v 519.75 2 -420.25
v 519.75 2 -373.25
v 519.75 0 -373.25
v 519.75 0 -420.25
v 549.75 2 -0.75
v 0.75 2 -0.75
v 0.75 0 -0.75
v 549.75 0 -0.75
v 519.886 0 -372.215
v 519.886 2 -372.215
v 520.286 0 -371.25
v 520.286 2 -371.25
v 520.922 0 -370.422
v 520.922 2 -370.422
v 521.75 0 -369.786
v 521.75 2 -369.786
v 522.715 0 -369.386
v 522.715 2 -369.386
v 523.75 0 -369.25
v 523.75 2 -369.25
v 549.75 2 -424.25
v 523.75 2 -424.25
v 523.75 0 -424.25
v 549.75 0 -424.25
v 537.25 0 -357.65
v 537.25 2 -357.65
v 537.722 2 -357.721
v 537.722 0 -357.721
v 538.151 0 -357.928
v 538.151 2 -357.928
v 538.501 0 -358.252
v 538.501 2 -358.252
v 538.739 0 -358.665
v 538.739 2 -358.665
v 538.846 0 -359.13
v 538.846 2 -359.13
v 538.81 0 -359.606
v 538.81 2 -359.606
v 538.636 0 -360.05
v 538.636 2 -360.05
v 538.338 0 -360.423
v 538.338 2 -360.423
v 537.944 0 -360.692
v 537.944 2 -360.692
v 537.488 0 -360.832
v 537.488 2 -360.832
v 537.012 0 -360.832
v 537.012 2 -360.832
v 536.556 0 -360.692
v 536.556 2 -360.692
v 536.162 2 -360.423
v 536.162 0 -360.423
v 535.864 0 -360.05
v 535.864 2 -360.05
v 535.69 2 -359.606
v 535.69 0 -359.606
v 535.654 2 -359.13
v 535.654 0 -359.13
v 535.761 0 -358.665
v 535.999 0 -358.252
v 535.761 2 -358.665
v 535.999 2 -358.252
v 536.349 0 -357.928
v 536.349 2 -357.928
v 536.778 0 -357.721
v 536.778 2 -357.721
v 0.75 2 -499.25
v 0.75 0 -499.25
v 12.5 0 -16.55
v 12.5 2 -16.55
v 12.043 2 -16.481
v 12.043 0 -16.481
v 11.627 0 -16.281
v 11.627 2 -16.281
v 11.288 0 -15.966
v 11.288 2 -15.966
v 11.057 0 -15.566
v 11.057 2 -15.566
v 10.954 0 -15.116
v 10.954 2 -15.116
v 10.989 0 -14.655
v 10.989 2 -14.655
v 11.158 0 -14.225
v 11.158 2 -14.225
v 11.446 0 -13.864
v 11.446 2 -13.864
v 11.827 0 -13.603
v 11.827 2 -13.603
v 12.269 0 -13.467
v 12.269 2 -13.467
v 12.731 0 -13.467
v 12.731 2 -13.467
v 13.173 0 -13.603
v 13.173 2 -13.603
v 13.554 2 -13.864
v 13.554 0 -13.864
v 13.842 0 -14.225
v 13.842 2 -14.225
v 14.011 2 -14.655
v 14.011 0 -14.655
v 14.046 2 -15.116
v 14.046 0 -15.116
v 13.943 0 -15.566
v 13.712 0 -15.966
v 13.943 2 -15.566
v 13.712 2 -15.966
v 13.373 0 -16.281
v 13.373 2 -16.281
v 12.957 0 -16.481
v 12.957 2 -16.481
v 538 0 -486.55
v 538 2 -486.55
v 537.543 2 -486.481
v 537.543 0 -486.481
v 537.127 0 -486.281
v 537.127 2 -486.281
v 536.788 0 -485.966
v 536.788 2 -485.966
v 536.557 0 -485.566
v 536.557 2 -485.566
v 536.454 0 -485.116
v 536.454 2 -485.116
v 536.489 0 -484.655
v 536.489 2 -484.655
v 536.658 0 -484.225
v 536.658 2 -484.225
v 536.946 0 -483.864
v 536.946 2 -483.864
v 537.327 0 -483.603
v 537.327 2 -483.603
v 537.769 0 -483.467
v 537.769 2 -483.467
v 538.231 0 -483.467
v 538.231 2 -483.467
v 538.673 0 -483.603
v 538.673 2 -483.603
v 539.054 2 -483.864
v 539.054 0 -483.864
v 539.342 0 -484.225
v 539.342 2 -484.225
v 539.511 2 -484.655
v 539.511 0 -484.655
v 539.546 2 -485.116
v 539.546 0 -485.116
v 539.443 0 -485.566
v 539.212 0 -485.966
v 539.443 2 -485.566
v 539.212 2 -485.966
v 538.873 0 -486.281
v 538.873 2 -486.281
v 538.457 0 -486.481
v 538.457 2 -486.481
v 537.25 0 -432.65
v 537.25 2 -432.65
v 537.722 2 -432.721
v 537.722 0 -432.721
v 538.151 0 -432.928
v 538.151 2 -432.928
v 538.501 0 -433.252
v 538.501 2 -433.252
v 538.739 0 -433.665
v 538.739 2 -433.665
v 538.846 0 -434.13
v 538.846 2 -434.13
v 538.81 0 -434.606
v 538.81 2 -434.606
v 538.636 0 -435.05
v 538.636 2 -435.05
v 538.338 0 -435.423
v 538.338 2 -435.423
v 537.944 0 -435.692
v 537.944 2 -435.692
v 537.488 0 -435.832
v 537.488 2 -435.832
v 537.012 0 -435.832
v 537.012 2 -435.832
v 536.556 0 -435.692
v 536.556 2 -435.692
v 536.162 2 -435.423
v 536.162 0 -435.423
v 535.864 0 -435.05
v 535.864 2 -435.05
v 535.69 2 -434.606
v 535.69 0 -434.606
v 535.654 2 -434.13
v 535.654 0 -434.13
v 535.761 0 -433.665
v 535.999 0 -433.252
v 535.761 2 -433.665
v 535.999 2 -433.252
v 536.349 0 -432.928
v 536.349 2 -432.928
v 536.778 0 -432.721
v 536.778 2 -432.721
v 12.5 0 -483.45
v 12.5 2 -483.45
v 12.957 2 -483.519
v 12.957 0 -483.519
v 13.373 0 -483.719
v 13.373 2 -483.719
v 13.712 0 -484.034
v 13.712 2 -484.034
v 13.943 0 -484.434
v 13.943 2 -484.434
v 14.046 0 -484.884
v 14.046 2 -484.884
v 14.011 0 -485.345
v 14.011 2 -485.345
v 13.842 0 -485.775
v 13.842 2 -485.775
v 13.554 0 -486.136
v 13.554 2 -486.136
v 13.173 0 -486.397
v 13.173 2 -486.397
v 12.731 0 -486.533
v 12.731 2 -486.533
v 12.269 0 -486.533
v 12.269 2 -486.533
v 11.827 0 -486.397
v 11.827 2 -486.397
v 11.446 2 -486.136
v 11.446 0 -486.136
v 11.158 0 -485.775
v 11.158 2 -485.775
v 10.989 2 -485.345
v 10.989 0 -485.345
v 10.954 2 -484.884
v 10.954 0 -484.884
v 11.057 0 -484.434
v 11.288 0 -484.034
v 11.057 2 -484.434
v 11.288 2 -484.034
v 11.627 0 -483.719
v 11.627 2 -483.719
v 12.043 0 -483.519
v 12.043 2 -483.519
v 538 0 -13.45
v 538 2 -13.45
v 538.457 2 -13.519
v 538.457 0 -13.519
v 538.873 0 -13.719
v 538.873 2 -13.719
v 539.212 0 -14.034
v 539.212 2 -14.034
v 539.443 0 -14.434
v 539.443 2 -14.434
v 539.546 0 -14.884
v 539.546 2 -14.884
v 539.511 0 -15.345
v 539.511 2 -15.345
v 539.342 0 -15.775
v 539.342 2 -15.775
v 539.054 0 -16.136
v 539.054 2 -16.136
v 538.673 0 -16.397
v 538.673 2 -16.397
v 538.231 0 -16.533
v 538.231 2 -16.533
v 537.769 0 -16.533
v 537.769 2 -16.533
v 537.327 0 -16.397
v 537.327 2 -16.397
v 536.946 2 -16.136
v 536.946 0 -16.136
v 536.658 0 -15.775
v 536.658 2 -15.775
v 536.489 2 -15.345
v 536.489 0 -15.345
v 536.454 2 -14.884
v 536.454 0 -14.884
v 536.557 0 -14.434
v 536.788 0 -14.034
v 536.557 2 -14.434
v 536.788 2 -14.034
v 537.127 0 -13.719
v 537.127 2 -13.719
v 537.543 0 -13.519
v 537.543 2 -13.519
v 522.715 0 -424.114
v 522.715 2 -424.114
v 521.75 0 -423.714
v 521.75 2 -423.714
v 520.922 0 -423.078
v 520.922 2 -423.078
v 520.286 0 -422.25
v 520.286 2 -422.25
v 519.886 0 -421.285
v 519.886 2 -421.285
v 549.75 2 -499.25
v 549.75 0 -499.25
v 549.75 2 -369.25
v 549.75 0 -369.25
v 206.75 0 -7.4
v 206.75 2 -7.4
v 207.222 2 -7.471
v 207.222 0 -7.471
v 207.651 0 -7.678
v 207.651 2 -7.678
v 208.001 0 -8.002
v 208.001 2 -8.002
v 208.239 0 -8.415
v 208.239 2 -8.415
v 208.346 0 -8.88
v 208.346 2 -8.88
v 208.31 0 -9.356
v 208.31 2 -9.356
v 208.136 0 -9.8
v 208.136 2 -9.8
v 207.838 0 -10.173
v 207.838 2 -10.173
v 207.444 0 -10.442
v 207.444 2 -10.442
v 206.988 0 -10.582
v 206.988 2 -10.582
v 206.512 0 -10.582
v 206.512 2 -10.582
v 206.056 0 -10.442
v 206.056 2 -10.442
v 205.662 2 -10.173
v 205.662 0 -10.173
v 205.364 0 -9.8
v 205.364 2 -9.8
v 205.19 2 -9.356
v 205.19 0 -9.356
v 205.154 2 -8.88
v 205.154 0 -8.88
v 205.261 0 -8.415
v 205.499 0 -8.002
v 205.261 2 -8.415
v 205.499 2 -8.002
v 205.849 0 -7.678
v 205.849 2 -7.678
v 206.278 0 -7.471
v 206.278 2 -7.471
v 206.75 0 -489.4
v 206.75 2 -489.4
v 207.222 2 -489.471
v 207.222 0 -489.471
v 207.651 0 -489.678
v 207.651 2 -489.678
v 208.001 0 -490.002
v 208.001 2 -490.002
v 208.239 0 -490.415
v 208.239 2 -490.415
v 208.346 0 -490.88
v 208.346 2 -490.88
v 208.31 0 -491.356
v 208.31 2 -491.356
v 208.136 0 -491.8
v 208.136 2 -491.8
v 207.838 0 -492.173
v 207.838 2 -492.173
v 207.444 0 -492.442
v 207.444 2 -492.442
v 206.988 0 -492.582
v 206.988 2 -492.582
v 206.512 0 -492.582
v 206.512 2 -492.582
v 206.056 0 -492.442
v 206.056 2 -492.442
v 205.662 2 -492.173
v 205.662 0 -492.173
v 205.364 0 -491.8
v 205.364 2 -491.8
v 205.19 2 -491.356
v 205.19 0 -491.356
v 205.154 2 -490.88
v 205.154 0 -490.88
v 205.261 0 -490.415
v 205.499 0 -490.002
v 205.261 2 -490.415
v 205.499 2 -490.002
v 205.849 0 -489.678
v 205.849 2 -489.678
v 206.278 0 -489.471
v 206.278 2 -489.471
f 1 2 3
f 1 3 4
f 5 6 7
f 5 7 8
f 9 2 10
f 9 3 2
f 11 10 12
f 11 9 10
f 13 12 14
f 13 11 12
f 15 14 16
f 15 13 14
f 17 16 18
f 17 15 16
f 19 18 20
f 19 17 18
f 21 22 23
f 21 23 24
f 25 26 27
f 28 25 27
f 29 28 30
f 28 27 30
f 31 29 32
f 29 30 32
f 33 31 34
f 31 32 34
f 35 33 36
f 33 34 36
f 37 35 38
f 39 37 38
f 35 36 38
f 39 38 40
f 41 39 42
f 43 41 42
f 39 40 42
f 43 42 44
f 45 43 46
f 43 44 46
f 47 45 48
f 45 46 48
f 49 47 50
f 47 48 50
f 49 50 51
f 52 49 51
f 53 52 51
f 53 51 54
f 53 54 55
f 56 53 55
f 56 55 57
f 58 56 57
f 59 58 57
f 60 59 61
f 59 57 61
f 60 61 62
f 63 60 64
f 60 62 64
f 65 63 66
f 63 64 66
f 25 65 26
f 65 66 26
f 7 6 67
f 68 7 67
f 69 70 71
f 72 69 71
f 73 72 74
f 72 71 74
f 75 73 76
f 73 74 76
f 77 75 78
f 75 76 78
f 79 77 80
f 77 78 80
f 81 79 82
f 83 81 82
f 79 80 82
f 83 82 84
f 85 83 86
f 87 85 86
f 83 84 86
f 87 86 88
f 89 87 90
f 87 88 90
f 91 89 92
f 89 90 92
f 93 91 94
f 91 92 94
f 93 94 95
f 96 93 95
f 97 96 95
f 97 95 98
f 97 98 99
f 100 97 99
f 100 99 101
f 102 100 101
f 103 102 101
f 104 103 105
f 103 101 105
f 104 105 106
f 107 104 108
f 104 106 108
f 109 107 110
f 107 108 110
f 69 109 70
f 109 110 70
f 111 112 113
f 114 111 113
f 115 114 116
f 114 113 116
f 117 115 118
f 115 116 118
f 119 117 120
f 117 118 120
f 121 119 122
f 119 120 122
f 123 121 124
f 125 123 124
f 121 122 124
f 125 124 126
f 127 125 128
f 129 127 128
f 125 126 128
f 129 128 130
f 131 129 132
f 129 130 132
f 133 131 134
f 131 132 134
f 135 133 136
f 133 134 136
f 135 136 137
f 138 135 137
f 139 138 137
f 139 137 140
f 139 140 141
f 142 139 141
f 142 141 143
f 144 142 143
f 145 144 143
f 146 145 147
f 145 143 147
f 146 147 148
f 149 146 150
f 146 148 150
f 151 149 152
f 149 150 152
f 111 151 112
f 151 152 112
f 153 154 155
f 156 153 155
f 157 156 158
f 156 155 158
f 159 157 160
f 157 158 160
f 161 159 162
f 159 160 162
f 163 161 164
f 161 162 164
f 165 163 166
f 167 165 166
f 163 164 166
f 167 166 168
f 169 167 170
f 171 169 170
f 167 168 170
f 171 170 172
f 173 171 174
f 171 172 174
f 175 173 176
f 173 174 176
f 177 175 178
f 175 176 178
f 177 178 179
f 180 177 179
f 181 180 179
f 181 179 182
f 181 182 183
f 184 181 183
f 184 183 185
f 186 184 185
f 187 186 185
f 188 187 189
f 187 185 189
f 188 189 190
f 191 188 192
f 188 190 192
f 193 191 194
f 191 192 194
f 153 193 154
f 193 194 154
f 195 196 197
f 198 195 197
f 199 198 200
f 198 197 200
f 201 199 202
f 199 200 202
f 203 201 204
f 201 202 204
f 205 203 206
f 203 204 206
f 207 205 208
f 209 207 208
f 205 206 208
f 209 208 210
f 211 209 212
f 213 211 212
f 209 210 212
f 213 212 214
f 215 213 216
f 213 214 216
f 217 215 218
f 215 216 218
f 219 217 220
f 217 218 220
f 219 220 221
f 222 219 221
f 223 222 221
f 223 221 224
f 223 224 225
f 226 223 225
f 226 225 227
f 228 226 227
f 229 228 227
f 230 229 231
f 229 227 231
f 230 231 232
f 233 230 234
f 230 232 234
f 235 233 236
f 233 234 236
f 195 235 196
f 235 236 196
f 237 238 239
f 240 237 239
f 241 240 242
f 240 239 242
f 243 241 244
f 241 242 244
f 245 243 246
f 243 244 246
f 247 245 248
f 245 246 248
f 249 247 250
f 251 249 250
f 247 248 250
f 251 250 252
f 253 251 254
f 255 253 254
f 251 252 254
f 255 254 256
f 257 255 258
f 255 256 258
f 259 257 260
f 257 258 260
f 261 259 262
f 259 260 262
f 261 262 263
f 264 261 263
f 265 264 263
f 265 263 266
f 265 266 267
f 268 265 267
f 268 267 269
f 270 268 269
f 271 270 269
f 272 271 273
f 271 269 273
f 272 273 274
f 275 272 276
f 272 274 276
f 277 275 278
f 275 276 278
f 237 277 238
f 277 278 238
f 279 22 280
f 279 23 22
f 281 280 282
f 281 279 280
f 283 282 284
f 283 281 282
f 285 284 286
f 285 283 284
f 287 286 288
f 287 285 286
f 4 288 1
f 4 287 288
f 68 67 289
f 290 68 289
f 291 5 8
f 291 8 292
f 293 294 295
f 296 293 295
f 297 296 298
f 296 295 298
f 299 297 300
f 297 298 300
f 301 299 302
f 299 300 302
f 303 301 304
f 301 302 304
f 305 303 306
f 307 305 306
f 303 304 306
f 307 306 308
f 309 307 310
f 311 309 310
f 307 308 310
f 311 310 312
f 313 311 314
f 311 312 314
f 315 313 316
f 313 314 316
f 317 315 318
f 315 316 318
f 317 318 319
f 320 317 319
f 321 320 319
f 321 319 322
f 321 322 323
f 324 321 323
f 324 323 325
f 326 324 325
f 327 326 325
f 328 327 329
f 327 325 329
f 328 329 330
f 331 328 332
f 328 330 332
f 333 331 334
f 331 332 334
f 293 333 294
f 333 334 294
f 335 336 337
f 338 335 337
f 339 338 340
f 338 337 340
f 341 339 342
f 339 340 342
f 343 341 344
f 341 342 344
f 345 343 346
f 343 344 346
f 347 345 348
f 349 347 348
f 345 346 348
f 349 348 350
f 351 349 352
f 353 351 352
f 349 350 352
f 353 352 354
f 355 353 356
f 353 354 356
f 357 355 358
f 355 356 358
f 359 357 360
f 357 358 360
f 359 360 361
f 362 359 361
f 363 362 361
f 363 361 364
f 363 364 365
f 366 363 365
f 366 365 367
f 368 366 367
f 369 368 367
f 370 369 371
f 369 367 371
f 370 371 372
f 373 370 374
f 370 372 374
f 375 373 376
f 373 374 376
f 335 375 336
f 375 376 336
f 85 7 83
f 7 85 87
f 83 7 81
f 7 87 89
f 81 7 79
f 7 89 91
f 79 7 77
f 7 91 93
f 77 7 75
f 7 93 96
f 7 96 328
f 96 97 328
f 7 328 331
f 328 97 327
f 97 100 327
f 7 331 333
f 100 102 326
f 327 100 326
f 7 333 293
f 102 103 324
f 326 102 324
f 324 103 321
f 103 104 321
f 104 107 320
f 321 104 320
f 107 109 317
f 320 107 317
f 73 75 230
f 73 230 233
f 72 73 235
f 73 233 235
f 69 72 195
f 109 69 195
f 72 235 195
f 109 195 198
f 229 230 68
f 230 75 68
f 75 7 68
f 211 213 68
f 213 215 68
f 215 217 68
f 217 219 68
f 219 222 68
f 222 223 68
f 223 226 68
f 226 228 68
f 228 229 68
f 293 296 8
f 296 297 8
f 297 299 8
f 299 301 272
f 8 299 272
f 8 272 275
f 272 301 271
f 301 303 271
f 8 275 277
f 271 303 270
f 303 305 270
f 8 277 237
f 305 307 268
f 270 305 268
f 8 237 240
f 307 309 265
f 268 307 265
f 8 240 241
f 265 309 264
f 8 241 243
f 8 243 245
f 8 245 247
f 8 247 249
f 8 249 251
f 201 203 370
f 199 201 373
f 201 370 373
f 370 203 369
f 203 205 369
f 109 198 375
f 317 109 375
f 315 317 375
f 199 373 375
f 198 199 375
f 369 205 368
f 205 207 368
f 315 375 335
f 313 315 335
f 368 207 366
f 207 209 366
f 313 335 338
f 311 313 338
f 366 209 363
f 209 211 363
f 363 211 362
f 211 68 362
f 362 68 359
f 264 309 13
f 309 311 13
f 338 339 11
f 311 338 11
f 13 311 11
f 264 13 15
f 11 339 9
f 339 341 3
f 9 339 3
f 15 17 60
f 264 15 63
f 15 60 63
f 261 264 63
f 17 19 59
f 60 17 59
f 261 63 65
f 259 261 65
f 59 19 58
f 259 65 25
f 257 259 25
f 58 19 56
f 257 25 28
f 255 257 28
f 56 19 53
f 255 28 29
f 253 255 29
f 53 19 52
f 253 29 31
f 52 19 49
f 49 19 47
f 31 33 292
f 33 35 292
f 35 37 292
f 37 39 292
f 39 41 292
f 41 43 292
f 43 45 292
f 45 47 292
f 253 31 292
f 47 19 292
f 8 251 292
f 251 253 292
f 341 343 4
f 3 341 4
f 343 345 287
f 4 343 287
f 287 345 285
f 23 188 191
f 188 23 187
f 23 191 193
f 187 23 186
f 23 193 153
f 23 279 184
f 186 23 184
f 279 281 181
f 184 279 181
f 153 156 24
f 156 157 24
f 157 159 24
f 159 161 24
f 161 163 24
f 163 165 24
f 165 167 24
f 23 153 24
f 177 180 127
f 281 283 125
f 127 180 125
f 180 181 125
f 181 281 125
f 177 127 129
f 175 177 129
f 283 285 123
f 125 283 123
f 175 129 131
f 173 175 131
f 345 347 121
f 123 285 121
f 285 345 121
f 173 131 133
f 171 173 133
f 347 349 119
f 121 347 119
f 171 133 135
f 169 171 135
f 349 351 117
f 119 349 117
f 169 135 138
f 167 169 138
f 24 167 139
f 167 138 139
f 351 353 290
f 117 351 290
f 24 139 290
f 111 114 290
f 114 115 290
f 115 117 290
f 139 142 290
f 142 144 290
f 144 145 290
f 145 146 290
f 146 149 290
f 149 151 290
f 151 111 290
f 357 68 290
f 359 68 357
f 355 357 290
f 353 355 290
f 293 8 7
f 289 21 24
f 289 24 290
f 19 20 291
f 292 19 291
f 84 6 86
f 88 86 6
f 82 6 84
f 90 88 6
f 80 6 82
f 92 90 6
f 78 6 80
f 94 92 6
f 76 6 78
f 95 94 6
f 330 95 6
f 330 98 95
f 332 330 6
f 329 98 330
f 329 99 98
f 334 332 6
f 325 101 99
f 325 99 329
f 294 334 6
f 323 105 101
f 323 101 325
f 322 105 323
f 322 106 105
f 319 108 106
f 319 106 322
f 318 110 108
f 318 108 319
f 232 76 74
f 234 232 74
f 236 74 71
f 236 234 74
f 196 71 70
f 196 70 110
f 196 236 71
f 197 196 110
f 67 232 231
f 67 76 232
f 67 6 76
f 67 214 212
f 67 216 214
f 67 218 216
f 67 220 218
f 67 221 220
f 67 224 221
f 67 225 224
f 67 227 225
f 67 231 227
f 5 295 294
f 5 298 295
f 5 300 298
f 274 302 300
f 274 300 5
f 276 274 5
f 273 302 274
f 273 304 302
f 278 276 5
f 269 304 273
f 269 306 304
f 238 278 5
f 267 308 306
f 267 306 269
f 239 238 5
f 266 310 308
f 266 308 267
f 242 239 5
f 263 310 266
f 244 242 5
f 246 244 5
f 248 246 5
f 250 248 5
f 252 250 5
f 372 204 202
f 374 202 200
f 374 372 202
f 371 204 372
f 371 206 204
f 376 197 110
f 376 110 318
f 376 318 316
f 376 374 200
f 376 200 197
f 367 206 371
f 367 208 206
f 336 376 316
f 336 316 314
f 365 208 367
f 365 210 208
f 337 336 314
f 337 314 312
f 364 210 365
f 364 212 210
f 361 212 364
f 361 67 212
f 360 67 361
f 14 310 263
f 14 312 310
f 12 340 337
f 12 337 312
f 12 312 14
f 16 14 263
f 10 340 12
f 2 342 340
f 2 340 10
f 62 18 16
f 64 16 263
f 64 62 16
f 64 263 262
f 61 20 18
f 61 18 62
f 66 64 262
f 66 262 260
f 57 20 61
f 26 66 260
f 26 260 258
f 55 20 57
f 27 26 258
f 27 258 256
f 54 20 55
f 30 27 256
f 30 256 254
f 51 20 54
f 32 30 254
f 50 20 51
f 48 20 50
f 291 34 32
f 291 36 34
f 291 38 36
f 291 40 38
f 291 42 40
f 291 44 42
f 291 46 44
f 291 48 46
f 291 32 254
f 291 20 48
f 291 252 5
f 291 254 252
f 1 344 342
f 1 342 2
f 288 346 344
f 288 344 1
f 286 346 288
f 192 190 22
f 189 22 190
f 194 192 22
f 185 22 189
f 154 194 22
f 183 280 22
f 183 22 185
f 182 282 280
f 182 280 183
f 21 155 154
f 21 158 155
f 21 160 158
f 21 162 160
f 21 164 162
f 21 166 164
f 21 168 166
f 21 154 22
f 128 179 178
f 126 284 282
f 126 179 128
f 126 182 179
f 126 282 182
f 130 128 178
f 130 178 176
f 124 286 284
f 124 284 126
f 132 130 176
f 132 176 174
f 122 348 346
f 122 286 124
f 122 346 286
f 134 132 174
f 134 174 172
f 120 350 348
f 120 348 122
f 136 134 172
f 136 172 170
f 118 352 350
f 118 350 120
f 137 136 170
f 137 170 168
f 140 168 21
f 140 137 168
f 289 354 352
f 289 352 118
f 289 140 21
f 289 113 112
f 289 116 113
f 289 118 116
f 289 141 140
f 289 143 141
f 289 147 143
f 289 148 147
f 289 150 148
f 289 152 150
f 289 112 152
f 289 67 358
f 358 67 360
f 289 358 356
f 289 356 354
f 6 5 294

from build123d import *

# Parameters (mm, degrees)
CROQUIS1_W              = 550.5
CROQUIS1_H              = 500
SALIENTE_EXTRUIR1_DEPTH = 2
CROQUIS2_R              = 1.55
CORTAR_EXTRUIR1_DEPTH   = 2
CROQUIS3_W              = 550.5
CROQUIS3_H              = 500
CROQUIS3_W_2            = 549
CROQUIS3_H_2            = 498.5
CORTAR_EXTRUIR2_DEPTH   = 2
CROQUIS4_W              = 30
CROQUIS4_H              = 55
CORTAR_EXTRUIR3_DEPTH   = 2
REDONDEO1_R             = 4
CROQUIS5_R              = 1.6
CORTAR_EXTRUIR4_DEPTH   = 2
CROQUIS6_R              = 1.6
CORTAR_EXTRUIR5_DEPTH   = 2


with BuildPart() as part:
    # Croquis1 → Saliente-Extruir1 (new body)
    with BuildSketch(Plane(origin=(0, 0, 0), x_dir=(1, 0, 0), z_dir=(0, 1, 0))):
        with Locations((275.25, 250)):
            Rectangle(CROQUIS1_W, CROQUIS1_H)
    extrude(amount=SALIENTE_EXTRUIR1_DEPTH)

    # Croquis2 → Cortar-Extruir1 (cut)
    with BuildSketch(Plane(origin=(0, 2, 0), x_dir=(1, 0, 0), z_dir=(0, 1, 0))):
        with Locations(Location((12.5, 485, 0), (0, 0, 270))):
            Circle(CROQUIS2_R)
        with Locations(Location((538, 485, 0), (0, 0, 90))):
            Circle(CROQUIS2_R)
        with Locations(Location((538, 15, 0), (0, 0, 270))):
            Circle(CROQUIS2_R)
        with Locations(Location((12.5, 15, 0), (0, 0, 90))):
            Circle(CROQUIS2_R)
    extrude(amount=-CORTAR_EXTRUIR1_DEPTH, mode=Mode.SUBTRACT)

    # Croquis3 → Cortar-Extruir2 (cut)
    with BuildSketch(Plane(origin=(0, 2, 0), x_dir=(1, 0, 0), z_dir=(0, 1, 0))):
        with Locations((275.25, 250)):
            Rectangle(CROQUIS3_W, CROQUIS3_H)
        with Locations((275.25, 250)):
            Rectangle(CROQUIS3_W_2, CROQUIS3_H_2, mode=Mode.SUBTRACT)
    extrude(amount=-CORTAR_EXTRUIR2_DEPTH, mode=Mode.SUBTRACT)

    # Croquis4 → Cortar-Extruir3 (cut)
    with BuildSketch(Plane(origin=(0, 2, 0), x_dir=(1, 0, 0), z_dir=(0, 1, 0))):
        with Locations((534.75, 396.75)):
            Rectangle(CROQUIS4_W, CROQUIS4_H)
    extrude(amount=-CORTAR_EXTRUIR3_DEPTH, mode=Mode.SUBTRACT)

    # Redondeo1
    redondeo1_edges = [part.edges().sort_by_distance(p)[0] for p in [
        (519.75, 1, -424.25),
        (519.75, 1, -369.25),
    ]]
    fillet(redondeo1_edges, radius=REDONDEO1_R)

    # Croquis5 → Cortar-Extruir4 (cut)
    with BuildSketch(Plane(origin=(0, 2, 0), x_dir=(1, 0, 0), z_dir=(0, 1, 0))):
        with Locations(Location((537.25, 434.25, 0), (0, 0, 270))):
            Circle(CROQUIS5_R)
        with Locations(Location((537.25, 359.25, 0), (0, 0, 270))):
            Circle(CROQUIS5_R)
    extrude(amount=-CORTAR_EXTRUIR4_DEPTH, mode=Mode.SUBTRACT)

    # Croquis6 → Cortar-Extruir5 (cut)
    with BuildSketch(Plane(origin=(0, 2, 0), x_dir=(1, 0, 0), z_dir=(0, 1, 0))):
        with Locations(Location((206.75, 491, 0), (0, 0, 270))):
            Circle(CROQUIS6_R)
        with Locations(Location((206.75, 9, 0), (0, 0, 270))):
            Circle(CROQUIS6_R)
    extrude(amount=-CORTAR_EXTRUIR5_DEPTH, mode=Mode.SUBTRACT)


solid = part.part
